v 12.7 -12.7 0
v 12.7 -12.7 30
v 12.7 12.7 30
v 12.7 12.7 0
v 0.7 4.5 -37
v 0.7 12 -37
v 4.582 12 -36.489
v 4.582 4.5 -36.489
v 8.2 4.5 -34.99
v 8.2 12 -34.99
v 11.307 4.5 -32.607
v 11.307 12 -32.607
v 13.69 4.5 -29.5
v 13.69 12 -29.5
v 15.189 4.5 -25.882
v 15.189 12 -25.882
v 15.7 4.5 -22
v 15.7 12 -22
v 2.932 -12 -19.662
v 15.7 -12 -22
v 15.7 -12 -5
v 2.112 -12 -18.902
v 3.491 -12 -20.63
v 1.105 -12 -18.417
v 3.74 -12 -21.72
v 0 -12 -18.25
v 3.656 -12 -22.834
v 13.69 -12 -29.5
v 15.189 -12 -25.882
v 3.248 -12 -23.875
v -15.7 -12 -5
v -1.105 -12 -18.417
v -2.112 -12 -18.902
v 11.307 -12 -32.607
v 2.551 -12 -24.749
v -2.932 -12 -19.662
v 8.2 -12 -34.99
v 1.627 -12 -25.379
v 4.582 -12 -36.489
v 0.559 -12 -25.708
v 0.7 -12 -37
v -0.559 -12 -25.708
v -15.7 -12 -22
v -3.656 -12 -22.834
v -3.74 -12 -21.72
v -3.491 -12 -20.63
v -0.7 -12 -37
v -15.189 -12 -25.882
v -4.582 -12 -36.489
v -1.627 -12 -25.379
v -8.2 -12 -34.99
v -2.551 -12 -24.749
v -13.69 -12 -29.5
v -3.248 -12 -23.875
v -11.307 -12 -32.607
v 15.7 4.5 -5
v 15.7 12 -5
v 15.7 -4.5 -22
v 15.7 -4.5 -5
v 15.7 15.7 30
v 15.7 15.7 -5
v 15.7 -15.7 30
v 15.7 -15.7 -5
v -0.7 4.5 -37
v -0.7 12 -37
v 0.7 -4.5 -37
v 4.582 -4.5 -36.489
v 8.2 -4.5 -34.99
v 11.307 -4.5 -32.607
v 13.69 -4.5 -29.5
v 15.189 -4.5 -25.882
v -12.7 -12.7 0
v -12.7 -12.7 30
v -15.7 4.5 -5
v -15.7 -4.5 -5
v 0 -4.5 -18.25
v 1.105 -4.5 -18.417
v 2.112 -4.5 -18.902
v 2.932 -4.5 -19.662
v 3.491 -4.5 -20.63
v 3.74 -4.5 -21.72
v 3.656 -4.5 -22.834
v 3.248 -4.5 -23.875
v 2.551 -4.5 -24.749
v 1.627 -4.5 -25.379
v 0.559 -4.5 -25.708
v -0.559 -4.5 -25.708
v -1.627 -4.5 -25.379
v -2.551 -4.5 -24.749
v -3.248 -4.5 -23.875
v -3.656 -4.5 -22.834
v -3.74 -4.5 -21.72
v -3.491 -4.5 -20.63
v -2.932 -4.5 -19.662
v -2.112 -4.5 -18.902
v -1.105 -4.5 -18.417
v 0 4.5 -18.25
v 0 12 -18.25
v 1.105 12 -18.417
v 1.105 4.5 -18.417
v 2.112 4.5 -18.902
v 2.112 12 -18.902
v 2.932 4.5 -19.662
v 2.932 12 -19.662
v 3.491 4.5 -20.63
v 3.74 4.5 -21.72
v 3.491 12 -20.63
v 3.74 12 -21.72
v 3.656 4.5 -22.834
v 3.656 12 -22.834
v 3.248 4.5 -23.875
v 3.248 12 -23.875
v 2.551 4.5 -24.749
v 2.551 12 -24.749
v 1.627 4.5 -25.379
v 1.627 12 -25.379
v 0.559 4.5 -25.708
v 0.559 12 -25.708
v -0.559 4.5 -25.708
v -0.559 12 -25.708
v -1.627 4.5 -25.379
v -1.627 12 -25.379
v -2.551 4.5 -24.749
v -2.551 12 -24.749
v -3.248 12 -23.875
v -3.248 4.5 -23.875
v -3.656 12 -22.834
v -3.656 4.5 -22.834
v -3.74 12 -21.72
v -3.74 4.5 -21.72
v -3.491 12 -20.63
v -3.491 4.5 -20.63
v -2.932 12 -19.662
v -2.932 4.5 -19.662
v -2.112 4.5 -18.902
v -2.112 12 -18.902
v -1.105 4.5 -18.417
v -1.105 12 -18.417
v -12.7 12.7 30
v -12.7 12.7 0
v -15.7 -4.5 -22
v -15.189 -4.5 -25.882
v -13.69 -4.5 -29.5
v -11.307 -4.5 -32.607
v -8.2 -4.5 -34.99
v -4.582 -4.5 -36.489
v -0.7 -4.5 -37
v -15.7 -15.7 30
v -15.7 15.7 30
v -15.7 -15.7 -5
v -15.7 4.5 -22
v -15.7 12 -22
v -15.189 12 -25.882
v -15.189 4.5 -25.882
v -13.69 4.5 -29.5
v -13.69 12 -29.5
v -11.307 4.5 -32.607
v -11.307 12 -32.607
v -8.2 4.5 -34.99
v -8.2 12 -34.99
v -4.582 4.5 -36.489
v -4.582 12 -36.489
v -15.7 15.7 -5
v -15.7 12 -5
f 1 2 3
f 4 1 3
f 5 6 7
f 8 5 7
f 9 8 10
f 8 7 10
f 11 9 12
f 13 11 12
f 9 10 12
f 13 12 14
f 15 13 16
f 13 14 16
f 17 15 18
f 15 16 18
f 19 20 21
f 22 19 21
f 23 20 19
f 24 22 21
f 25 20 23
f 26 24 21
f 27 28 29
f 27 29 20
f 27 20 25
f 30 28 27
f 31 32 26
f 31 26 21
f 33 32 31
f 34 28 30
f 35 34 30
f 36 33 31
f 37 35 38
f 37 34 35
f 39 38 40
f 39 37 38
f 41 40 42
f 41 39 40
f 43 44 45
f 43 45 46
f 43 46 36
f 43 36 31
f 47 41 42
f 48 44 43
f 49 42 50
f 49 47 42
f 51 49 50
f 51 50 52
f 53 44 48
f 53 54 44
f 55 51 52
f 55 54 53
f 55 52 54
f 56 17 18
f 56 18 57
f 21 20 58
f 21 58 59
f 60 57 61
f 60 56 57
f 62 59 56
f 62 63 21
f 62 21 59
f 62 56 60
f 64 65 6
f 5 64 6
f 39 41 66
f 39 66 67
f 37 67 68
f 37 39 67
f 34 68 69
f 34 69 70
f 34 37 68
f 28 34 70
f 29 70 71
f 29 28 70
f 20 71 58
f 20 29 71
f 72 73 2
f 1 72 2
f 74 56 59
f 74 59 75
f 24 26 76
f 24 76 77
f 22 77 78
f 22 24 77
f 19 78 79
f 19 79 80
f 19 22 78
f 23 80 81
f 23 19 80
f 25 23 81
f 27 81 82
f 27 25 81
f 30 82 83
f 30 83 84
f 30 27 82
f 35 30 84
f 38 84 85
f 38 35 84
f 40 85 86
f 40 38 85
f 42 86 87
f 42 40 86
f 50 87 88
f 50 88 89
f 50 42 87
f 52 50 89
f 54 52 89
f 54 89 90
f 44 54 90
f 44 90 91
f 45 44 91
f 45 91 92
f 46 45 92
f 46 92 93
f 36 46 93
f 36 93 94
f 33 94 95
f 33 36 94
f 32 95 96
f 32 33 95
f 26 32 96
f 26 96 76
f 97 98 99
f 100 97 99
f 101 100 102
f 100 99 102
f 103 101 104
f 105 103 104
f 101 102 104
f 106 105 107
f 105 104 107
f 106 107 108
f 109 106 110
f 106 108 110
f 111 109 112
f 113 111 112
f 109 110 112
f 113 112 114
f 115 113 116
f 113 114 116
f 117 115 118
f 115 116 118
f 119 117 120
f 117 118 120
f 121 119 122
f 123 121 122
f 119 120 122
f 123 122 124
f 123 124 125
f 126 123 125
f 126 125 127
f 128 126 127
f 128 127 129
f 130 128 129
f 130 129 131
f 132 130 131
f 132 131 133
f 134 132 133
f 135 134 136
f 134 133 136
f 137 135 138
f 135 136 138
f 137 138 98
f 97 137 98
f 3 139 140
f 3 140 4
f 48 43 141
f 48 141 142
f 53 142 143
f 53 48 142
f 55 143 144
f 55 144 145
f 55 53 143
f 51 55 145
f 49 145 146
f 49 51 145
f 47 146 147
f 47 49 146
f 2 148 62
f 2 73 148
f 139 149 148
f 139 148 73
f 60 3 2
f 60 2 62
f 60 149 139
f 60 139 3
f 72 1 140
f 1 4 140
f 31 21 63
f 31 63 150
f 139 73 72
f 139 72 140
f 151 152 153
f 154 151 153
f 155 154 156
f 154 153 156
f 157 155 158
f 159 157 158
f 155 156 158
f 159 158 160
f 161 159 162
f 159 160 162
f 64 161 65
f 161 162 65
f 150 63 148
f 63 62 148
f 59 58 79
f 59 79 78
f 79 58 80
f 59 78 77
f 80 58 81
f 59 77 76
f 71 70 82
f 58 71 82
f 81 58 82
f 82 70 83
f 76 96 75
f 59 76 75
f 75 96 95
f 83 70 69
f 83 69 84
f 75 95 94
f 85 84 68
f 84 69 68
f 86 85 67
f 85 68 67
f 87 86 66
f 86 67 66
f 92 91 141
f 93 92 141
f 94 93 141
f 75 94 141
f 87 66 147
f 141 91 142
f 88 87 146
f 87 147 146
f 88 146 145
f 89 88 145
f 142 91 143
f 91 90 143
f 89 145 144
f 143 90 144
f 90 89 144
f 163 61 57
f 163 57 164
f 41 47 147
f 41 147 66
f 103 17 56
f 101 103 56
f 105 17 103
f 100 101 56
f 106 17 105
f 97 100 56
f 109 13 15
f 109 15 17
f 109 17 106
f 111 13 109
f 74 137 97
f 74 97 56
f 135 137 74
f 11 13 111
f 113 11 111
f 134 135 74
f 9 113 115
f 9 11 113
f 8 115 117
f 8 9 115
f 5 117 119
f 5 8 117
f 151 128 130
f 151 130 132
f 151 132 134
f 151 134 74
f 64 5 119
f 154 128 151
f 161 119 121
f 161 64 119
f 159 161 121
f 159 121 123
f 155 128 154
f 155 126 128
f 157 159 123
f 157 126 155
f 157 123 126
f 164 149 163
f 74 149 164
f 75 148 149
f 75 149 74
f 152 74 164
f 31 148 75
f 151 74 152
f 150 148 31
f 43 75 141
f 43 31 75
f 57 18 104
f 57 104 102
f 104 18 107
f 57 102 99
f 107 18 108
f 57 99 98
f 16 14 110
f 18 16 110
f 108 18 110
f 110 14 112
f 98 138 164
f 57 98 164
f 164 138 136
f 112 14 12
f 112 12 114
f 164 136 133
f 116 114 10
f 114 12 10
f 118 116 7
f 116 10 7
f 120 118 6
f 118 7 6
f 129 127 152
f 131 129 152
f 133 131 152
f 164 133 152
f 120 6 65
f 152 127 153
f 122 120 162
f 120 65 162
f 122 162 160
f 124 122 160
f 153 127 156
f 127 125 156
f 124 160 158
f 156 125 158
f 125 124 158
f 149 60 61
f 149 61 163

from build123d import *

# Parameters (mm, degrees)
SKETCH1_W           = 31.4
SKETCH1_H           = 31.4
SKETCH1_W_2         = 25.4
SKETCH1_H_2         = 25.4
BOSS_EXTRUDE1_DEPTH = 30
SKETCH2_W           = 31.4
SKETCH2_H           = 31.4
BOSS_EXTRUDE2_DEPTH = 5
SKETCH3_W           = 31.4
SKETCH3_H           = 7.5
BOSS_EXTRUDE3_DEPTH = 5
SKETCH6_R           = 3.75
BOSS_EXTRUDE6_DEPTH = 7.5


with BuildPart() as part:
    # Sketch1 → Boss-Extrude1 (new body)
    with BuildSketch(Plane.XY):
        Rectangle(SKETCH1_W, SKETCH1_H)
        Rectangle(SKETCH1_W_2, SKETCH1_H_2, mode=Mode.SUBTRACT)
    extrude(amount=BOSS_EXTRUDE1_DEPTH)

    # Sketch2 → Boss-Extrude2 (add)
    with BuildSketch(Plane(origin=(0, 0, 0), x_dir=(-1, 0, 0), z_dir=(0, 0, -1))):
        Rectangle(SKETCH2_W, SKETCH2_H)
    extrude(amount=BOSS_EXTRUDE2_DEPTH)

    # Sketch3 → Boss-Extrude3 (add)
    with BuildSketch(Plane(origin=(0, 0, -5), x_dir=(-1, 0, 0), z_dir=(0, 0, -1))):
        with Locations((0, 8.25)):
            Rectangle(SKETCH3_W, SKETCH3_H)
    boss_extrude3 = extrude(amount=BOSS_EXTRUDE3_DEPTH)

    # Sketch6 → Boss-Extrude6 (add)
    with BuildSketch(Plane(origin=(0, 12, 0), x_dir=(1, 0, 0), z_dir=(0, 1, 0))):
        with BuildLine():
            Line((-15.7, 10), (-15.7, 22))
            ThreePointArc((-15.7, 22), (-11.306601718, 32.606601718), (-0.7, 37))
            Line((-0.7, 37), (0.7, 37))
            ThreePointArc((0.7, 37), (11.306601718, 32.606601718), (15.7, 22))
            Line((15.7, 22), (15.7, 10))
            Line((15.7, 10), (-15.7, 10))
        make_face()
        with Locations(Location((0, 22, 0), (0, 0, 270))):
            Circle(SKETCH6_R, mode=Mode.SUBTRACT)
    boss_extrude6 = extrude(amount=-BOSS_EXTRUDE6_DEPTH)

    # Mirror1: Boss-Extrude3, Boss-Extrude6 across plane
    add(boss_extrude3.mirror(Plane.ZX))
    add(boss_extrude6.mirror(Plane.ZX))


solid = part.part
